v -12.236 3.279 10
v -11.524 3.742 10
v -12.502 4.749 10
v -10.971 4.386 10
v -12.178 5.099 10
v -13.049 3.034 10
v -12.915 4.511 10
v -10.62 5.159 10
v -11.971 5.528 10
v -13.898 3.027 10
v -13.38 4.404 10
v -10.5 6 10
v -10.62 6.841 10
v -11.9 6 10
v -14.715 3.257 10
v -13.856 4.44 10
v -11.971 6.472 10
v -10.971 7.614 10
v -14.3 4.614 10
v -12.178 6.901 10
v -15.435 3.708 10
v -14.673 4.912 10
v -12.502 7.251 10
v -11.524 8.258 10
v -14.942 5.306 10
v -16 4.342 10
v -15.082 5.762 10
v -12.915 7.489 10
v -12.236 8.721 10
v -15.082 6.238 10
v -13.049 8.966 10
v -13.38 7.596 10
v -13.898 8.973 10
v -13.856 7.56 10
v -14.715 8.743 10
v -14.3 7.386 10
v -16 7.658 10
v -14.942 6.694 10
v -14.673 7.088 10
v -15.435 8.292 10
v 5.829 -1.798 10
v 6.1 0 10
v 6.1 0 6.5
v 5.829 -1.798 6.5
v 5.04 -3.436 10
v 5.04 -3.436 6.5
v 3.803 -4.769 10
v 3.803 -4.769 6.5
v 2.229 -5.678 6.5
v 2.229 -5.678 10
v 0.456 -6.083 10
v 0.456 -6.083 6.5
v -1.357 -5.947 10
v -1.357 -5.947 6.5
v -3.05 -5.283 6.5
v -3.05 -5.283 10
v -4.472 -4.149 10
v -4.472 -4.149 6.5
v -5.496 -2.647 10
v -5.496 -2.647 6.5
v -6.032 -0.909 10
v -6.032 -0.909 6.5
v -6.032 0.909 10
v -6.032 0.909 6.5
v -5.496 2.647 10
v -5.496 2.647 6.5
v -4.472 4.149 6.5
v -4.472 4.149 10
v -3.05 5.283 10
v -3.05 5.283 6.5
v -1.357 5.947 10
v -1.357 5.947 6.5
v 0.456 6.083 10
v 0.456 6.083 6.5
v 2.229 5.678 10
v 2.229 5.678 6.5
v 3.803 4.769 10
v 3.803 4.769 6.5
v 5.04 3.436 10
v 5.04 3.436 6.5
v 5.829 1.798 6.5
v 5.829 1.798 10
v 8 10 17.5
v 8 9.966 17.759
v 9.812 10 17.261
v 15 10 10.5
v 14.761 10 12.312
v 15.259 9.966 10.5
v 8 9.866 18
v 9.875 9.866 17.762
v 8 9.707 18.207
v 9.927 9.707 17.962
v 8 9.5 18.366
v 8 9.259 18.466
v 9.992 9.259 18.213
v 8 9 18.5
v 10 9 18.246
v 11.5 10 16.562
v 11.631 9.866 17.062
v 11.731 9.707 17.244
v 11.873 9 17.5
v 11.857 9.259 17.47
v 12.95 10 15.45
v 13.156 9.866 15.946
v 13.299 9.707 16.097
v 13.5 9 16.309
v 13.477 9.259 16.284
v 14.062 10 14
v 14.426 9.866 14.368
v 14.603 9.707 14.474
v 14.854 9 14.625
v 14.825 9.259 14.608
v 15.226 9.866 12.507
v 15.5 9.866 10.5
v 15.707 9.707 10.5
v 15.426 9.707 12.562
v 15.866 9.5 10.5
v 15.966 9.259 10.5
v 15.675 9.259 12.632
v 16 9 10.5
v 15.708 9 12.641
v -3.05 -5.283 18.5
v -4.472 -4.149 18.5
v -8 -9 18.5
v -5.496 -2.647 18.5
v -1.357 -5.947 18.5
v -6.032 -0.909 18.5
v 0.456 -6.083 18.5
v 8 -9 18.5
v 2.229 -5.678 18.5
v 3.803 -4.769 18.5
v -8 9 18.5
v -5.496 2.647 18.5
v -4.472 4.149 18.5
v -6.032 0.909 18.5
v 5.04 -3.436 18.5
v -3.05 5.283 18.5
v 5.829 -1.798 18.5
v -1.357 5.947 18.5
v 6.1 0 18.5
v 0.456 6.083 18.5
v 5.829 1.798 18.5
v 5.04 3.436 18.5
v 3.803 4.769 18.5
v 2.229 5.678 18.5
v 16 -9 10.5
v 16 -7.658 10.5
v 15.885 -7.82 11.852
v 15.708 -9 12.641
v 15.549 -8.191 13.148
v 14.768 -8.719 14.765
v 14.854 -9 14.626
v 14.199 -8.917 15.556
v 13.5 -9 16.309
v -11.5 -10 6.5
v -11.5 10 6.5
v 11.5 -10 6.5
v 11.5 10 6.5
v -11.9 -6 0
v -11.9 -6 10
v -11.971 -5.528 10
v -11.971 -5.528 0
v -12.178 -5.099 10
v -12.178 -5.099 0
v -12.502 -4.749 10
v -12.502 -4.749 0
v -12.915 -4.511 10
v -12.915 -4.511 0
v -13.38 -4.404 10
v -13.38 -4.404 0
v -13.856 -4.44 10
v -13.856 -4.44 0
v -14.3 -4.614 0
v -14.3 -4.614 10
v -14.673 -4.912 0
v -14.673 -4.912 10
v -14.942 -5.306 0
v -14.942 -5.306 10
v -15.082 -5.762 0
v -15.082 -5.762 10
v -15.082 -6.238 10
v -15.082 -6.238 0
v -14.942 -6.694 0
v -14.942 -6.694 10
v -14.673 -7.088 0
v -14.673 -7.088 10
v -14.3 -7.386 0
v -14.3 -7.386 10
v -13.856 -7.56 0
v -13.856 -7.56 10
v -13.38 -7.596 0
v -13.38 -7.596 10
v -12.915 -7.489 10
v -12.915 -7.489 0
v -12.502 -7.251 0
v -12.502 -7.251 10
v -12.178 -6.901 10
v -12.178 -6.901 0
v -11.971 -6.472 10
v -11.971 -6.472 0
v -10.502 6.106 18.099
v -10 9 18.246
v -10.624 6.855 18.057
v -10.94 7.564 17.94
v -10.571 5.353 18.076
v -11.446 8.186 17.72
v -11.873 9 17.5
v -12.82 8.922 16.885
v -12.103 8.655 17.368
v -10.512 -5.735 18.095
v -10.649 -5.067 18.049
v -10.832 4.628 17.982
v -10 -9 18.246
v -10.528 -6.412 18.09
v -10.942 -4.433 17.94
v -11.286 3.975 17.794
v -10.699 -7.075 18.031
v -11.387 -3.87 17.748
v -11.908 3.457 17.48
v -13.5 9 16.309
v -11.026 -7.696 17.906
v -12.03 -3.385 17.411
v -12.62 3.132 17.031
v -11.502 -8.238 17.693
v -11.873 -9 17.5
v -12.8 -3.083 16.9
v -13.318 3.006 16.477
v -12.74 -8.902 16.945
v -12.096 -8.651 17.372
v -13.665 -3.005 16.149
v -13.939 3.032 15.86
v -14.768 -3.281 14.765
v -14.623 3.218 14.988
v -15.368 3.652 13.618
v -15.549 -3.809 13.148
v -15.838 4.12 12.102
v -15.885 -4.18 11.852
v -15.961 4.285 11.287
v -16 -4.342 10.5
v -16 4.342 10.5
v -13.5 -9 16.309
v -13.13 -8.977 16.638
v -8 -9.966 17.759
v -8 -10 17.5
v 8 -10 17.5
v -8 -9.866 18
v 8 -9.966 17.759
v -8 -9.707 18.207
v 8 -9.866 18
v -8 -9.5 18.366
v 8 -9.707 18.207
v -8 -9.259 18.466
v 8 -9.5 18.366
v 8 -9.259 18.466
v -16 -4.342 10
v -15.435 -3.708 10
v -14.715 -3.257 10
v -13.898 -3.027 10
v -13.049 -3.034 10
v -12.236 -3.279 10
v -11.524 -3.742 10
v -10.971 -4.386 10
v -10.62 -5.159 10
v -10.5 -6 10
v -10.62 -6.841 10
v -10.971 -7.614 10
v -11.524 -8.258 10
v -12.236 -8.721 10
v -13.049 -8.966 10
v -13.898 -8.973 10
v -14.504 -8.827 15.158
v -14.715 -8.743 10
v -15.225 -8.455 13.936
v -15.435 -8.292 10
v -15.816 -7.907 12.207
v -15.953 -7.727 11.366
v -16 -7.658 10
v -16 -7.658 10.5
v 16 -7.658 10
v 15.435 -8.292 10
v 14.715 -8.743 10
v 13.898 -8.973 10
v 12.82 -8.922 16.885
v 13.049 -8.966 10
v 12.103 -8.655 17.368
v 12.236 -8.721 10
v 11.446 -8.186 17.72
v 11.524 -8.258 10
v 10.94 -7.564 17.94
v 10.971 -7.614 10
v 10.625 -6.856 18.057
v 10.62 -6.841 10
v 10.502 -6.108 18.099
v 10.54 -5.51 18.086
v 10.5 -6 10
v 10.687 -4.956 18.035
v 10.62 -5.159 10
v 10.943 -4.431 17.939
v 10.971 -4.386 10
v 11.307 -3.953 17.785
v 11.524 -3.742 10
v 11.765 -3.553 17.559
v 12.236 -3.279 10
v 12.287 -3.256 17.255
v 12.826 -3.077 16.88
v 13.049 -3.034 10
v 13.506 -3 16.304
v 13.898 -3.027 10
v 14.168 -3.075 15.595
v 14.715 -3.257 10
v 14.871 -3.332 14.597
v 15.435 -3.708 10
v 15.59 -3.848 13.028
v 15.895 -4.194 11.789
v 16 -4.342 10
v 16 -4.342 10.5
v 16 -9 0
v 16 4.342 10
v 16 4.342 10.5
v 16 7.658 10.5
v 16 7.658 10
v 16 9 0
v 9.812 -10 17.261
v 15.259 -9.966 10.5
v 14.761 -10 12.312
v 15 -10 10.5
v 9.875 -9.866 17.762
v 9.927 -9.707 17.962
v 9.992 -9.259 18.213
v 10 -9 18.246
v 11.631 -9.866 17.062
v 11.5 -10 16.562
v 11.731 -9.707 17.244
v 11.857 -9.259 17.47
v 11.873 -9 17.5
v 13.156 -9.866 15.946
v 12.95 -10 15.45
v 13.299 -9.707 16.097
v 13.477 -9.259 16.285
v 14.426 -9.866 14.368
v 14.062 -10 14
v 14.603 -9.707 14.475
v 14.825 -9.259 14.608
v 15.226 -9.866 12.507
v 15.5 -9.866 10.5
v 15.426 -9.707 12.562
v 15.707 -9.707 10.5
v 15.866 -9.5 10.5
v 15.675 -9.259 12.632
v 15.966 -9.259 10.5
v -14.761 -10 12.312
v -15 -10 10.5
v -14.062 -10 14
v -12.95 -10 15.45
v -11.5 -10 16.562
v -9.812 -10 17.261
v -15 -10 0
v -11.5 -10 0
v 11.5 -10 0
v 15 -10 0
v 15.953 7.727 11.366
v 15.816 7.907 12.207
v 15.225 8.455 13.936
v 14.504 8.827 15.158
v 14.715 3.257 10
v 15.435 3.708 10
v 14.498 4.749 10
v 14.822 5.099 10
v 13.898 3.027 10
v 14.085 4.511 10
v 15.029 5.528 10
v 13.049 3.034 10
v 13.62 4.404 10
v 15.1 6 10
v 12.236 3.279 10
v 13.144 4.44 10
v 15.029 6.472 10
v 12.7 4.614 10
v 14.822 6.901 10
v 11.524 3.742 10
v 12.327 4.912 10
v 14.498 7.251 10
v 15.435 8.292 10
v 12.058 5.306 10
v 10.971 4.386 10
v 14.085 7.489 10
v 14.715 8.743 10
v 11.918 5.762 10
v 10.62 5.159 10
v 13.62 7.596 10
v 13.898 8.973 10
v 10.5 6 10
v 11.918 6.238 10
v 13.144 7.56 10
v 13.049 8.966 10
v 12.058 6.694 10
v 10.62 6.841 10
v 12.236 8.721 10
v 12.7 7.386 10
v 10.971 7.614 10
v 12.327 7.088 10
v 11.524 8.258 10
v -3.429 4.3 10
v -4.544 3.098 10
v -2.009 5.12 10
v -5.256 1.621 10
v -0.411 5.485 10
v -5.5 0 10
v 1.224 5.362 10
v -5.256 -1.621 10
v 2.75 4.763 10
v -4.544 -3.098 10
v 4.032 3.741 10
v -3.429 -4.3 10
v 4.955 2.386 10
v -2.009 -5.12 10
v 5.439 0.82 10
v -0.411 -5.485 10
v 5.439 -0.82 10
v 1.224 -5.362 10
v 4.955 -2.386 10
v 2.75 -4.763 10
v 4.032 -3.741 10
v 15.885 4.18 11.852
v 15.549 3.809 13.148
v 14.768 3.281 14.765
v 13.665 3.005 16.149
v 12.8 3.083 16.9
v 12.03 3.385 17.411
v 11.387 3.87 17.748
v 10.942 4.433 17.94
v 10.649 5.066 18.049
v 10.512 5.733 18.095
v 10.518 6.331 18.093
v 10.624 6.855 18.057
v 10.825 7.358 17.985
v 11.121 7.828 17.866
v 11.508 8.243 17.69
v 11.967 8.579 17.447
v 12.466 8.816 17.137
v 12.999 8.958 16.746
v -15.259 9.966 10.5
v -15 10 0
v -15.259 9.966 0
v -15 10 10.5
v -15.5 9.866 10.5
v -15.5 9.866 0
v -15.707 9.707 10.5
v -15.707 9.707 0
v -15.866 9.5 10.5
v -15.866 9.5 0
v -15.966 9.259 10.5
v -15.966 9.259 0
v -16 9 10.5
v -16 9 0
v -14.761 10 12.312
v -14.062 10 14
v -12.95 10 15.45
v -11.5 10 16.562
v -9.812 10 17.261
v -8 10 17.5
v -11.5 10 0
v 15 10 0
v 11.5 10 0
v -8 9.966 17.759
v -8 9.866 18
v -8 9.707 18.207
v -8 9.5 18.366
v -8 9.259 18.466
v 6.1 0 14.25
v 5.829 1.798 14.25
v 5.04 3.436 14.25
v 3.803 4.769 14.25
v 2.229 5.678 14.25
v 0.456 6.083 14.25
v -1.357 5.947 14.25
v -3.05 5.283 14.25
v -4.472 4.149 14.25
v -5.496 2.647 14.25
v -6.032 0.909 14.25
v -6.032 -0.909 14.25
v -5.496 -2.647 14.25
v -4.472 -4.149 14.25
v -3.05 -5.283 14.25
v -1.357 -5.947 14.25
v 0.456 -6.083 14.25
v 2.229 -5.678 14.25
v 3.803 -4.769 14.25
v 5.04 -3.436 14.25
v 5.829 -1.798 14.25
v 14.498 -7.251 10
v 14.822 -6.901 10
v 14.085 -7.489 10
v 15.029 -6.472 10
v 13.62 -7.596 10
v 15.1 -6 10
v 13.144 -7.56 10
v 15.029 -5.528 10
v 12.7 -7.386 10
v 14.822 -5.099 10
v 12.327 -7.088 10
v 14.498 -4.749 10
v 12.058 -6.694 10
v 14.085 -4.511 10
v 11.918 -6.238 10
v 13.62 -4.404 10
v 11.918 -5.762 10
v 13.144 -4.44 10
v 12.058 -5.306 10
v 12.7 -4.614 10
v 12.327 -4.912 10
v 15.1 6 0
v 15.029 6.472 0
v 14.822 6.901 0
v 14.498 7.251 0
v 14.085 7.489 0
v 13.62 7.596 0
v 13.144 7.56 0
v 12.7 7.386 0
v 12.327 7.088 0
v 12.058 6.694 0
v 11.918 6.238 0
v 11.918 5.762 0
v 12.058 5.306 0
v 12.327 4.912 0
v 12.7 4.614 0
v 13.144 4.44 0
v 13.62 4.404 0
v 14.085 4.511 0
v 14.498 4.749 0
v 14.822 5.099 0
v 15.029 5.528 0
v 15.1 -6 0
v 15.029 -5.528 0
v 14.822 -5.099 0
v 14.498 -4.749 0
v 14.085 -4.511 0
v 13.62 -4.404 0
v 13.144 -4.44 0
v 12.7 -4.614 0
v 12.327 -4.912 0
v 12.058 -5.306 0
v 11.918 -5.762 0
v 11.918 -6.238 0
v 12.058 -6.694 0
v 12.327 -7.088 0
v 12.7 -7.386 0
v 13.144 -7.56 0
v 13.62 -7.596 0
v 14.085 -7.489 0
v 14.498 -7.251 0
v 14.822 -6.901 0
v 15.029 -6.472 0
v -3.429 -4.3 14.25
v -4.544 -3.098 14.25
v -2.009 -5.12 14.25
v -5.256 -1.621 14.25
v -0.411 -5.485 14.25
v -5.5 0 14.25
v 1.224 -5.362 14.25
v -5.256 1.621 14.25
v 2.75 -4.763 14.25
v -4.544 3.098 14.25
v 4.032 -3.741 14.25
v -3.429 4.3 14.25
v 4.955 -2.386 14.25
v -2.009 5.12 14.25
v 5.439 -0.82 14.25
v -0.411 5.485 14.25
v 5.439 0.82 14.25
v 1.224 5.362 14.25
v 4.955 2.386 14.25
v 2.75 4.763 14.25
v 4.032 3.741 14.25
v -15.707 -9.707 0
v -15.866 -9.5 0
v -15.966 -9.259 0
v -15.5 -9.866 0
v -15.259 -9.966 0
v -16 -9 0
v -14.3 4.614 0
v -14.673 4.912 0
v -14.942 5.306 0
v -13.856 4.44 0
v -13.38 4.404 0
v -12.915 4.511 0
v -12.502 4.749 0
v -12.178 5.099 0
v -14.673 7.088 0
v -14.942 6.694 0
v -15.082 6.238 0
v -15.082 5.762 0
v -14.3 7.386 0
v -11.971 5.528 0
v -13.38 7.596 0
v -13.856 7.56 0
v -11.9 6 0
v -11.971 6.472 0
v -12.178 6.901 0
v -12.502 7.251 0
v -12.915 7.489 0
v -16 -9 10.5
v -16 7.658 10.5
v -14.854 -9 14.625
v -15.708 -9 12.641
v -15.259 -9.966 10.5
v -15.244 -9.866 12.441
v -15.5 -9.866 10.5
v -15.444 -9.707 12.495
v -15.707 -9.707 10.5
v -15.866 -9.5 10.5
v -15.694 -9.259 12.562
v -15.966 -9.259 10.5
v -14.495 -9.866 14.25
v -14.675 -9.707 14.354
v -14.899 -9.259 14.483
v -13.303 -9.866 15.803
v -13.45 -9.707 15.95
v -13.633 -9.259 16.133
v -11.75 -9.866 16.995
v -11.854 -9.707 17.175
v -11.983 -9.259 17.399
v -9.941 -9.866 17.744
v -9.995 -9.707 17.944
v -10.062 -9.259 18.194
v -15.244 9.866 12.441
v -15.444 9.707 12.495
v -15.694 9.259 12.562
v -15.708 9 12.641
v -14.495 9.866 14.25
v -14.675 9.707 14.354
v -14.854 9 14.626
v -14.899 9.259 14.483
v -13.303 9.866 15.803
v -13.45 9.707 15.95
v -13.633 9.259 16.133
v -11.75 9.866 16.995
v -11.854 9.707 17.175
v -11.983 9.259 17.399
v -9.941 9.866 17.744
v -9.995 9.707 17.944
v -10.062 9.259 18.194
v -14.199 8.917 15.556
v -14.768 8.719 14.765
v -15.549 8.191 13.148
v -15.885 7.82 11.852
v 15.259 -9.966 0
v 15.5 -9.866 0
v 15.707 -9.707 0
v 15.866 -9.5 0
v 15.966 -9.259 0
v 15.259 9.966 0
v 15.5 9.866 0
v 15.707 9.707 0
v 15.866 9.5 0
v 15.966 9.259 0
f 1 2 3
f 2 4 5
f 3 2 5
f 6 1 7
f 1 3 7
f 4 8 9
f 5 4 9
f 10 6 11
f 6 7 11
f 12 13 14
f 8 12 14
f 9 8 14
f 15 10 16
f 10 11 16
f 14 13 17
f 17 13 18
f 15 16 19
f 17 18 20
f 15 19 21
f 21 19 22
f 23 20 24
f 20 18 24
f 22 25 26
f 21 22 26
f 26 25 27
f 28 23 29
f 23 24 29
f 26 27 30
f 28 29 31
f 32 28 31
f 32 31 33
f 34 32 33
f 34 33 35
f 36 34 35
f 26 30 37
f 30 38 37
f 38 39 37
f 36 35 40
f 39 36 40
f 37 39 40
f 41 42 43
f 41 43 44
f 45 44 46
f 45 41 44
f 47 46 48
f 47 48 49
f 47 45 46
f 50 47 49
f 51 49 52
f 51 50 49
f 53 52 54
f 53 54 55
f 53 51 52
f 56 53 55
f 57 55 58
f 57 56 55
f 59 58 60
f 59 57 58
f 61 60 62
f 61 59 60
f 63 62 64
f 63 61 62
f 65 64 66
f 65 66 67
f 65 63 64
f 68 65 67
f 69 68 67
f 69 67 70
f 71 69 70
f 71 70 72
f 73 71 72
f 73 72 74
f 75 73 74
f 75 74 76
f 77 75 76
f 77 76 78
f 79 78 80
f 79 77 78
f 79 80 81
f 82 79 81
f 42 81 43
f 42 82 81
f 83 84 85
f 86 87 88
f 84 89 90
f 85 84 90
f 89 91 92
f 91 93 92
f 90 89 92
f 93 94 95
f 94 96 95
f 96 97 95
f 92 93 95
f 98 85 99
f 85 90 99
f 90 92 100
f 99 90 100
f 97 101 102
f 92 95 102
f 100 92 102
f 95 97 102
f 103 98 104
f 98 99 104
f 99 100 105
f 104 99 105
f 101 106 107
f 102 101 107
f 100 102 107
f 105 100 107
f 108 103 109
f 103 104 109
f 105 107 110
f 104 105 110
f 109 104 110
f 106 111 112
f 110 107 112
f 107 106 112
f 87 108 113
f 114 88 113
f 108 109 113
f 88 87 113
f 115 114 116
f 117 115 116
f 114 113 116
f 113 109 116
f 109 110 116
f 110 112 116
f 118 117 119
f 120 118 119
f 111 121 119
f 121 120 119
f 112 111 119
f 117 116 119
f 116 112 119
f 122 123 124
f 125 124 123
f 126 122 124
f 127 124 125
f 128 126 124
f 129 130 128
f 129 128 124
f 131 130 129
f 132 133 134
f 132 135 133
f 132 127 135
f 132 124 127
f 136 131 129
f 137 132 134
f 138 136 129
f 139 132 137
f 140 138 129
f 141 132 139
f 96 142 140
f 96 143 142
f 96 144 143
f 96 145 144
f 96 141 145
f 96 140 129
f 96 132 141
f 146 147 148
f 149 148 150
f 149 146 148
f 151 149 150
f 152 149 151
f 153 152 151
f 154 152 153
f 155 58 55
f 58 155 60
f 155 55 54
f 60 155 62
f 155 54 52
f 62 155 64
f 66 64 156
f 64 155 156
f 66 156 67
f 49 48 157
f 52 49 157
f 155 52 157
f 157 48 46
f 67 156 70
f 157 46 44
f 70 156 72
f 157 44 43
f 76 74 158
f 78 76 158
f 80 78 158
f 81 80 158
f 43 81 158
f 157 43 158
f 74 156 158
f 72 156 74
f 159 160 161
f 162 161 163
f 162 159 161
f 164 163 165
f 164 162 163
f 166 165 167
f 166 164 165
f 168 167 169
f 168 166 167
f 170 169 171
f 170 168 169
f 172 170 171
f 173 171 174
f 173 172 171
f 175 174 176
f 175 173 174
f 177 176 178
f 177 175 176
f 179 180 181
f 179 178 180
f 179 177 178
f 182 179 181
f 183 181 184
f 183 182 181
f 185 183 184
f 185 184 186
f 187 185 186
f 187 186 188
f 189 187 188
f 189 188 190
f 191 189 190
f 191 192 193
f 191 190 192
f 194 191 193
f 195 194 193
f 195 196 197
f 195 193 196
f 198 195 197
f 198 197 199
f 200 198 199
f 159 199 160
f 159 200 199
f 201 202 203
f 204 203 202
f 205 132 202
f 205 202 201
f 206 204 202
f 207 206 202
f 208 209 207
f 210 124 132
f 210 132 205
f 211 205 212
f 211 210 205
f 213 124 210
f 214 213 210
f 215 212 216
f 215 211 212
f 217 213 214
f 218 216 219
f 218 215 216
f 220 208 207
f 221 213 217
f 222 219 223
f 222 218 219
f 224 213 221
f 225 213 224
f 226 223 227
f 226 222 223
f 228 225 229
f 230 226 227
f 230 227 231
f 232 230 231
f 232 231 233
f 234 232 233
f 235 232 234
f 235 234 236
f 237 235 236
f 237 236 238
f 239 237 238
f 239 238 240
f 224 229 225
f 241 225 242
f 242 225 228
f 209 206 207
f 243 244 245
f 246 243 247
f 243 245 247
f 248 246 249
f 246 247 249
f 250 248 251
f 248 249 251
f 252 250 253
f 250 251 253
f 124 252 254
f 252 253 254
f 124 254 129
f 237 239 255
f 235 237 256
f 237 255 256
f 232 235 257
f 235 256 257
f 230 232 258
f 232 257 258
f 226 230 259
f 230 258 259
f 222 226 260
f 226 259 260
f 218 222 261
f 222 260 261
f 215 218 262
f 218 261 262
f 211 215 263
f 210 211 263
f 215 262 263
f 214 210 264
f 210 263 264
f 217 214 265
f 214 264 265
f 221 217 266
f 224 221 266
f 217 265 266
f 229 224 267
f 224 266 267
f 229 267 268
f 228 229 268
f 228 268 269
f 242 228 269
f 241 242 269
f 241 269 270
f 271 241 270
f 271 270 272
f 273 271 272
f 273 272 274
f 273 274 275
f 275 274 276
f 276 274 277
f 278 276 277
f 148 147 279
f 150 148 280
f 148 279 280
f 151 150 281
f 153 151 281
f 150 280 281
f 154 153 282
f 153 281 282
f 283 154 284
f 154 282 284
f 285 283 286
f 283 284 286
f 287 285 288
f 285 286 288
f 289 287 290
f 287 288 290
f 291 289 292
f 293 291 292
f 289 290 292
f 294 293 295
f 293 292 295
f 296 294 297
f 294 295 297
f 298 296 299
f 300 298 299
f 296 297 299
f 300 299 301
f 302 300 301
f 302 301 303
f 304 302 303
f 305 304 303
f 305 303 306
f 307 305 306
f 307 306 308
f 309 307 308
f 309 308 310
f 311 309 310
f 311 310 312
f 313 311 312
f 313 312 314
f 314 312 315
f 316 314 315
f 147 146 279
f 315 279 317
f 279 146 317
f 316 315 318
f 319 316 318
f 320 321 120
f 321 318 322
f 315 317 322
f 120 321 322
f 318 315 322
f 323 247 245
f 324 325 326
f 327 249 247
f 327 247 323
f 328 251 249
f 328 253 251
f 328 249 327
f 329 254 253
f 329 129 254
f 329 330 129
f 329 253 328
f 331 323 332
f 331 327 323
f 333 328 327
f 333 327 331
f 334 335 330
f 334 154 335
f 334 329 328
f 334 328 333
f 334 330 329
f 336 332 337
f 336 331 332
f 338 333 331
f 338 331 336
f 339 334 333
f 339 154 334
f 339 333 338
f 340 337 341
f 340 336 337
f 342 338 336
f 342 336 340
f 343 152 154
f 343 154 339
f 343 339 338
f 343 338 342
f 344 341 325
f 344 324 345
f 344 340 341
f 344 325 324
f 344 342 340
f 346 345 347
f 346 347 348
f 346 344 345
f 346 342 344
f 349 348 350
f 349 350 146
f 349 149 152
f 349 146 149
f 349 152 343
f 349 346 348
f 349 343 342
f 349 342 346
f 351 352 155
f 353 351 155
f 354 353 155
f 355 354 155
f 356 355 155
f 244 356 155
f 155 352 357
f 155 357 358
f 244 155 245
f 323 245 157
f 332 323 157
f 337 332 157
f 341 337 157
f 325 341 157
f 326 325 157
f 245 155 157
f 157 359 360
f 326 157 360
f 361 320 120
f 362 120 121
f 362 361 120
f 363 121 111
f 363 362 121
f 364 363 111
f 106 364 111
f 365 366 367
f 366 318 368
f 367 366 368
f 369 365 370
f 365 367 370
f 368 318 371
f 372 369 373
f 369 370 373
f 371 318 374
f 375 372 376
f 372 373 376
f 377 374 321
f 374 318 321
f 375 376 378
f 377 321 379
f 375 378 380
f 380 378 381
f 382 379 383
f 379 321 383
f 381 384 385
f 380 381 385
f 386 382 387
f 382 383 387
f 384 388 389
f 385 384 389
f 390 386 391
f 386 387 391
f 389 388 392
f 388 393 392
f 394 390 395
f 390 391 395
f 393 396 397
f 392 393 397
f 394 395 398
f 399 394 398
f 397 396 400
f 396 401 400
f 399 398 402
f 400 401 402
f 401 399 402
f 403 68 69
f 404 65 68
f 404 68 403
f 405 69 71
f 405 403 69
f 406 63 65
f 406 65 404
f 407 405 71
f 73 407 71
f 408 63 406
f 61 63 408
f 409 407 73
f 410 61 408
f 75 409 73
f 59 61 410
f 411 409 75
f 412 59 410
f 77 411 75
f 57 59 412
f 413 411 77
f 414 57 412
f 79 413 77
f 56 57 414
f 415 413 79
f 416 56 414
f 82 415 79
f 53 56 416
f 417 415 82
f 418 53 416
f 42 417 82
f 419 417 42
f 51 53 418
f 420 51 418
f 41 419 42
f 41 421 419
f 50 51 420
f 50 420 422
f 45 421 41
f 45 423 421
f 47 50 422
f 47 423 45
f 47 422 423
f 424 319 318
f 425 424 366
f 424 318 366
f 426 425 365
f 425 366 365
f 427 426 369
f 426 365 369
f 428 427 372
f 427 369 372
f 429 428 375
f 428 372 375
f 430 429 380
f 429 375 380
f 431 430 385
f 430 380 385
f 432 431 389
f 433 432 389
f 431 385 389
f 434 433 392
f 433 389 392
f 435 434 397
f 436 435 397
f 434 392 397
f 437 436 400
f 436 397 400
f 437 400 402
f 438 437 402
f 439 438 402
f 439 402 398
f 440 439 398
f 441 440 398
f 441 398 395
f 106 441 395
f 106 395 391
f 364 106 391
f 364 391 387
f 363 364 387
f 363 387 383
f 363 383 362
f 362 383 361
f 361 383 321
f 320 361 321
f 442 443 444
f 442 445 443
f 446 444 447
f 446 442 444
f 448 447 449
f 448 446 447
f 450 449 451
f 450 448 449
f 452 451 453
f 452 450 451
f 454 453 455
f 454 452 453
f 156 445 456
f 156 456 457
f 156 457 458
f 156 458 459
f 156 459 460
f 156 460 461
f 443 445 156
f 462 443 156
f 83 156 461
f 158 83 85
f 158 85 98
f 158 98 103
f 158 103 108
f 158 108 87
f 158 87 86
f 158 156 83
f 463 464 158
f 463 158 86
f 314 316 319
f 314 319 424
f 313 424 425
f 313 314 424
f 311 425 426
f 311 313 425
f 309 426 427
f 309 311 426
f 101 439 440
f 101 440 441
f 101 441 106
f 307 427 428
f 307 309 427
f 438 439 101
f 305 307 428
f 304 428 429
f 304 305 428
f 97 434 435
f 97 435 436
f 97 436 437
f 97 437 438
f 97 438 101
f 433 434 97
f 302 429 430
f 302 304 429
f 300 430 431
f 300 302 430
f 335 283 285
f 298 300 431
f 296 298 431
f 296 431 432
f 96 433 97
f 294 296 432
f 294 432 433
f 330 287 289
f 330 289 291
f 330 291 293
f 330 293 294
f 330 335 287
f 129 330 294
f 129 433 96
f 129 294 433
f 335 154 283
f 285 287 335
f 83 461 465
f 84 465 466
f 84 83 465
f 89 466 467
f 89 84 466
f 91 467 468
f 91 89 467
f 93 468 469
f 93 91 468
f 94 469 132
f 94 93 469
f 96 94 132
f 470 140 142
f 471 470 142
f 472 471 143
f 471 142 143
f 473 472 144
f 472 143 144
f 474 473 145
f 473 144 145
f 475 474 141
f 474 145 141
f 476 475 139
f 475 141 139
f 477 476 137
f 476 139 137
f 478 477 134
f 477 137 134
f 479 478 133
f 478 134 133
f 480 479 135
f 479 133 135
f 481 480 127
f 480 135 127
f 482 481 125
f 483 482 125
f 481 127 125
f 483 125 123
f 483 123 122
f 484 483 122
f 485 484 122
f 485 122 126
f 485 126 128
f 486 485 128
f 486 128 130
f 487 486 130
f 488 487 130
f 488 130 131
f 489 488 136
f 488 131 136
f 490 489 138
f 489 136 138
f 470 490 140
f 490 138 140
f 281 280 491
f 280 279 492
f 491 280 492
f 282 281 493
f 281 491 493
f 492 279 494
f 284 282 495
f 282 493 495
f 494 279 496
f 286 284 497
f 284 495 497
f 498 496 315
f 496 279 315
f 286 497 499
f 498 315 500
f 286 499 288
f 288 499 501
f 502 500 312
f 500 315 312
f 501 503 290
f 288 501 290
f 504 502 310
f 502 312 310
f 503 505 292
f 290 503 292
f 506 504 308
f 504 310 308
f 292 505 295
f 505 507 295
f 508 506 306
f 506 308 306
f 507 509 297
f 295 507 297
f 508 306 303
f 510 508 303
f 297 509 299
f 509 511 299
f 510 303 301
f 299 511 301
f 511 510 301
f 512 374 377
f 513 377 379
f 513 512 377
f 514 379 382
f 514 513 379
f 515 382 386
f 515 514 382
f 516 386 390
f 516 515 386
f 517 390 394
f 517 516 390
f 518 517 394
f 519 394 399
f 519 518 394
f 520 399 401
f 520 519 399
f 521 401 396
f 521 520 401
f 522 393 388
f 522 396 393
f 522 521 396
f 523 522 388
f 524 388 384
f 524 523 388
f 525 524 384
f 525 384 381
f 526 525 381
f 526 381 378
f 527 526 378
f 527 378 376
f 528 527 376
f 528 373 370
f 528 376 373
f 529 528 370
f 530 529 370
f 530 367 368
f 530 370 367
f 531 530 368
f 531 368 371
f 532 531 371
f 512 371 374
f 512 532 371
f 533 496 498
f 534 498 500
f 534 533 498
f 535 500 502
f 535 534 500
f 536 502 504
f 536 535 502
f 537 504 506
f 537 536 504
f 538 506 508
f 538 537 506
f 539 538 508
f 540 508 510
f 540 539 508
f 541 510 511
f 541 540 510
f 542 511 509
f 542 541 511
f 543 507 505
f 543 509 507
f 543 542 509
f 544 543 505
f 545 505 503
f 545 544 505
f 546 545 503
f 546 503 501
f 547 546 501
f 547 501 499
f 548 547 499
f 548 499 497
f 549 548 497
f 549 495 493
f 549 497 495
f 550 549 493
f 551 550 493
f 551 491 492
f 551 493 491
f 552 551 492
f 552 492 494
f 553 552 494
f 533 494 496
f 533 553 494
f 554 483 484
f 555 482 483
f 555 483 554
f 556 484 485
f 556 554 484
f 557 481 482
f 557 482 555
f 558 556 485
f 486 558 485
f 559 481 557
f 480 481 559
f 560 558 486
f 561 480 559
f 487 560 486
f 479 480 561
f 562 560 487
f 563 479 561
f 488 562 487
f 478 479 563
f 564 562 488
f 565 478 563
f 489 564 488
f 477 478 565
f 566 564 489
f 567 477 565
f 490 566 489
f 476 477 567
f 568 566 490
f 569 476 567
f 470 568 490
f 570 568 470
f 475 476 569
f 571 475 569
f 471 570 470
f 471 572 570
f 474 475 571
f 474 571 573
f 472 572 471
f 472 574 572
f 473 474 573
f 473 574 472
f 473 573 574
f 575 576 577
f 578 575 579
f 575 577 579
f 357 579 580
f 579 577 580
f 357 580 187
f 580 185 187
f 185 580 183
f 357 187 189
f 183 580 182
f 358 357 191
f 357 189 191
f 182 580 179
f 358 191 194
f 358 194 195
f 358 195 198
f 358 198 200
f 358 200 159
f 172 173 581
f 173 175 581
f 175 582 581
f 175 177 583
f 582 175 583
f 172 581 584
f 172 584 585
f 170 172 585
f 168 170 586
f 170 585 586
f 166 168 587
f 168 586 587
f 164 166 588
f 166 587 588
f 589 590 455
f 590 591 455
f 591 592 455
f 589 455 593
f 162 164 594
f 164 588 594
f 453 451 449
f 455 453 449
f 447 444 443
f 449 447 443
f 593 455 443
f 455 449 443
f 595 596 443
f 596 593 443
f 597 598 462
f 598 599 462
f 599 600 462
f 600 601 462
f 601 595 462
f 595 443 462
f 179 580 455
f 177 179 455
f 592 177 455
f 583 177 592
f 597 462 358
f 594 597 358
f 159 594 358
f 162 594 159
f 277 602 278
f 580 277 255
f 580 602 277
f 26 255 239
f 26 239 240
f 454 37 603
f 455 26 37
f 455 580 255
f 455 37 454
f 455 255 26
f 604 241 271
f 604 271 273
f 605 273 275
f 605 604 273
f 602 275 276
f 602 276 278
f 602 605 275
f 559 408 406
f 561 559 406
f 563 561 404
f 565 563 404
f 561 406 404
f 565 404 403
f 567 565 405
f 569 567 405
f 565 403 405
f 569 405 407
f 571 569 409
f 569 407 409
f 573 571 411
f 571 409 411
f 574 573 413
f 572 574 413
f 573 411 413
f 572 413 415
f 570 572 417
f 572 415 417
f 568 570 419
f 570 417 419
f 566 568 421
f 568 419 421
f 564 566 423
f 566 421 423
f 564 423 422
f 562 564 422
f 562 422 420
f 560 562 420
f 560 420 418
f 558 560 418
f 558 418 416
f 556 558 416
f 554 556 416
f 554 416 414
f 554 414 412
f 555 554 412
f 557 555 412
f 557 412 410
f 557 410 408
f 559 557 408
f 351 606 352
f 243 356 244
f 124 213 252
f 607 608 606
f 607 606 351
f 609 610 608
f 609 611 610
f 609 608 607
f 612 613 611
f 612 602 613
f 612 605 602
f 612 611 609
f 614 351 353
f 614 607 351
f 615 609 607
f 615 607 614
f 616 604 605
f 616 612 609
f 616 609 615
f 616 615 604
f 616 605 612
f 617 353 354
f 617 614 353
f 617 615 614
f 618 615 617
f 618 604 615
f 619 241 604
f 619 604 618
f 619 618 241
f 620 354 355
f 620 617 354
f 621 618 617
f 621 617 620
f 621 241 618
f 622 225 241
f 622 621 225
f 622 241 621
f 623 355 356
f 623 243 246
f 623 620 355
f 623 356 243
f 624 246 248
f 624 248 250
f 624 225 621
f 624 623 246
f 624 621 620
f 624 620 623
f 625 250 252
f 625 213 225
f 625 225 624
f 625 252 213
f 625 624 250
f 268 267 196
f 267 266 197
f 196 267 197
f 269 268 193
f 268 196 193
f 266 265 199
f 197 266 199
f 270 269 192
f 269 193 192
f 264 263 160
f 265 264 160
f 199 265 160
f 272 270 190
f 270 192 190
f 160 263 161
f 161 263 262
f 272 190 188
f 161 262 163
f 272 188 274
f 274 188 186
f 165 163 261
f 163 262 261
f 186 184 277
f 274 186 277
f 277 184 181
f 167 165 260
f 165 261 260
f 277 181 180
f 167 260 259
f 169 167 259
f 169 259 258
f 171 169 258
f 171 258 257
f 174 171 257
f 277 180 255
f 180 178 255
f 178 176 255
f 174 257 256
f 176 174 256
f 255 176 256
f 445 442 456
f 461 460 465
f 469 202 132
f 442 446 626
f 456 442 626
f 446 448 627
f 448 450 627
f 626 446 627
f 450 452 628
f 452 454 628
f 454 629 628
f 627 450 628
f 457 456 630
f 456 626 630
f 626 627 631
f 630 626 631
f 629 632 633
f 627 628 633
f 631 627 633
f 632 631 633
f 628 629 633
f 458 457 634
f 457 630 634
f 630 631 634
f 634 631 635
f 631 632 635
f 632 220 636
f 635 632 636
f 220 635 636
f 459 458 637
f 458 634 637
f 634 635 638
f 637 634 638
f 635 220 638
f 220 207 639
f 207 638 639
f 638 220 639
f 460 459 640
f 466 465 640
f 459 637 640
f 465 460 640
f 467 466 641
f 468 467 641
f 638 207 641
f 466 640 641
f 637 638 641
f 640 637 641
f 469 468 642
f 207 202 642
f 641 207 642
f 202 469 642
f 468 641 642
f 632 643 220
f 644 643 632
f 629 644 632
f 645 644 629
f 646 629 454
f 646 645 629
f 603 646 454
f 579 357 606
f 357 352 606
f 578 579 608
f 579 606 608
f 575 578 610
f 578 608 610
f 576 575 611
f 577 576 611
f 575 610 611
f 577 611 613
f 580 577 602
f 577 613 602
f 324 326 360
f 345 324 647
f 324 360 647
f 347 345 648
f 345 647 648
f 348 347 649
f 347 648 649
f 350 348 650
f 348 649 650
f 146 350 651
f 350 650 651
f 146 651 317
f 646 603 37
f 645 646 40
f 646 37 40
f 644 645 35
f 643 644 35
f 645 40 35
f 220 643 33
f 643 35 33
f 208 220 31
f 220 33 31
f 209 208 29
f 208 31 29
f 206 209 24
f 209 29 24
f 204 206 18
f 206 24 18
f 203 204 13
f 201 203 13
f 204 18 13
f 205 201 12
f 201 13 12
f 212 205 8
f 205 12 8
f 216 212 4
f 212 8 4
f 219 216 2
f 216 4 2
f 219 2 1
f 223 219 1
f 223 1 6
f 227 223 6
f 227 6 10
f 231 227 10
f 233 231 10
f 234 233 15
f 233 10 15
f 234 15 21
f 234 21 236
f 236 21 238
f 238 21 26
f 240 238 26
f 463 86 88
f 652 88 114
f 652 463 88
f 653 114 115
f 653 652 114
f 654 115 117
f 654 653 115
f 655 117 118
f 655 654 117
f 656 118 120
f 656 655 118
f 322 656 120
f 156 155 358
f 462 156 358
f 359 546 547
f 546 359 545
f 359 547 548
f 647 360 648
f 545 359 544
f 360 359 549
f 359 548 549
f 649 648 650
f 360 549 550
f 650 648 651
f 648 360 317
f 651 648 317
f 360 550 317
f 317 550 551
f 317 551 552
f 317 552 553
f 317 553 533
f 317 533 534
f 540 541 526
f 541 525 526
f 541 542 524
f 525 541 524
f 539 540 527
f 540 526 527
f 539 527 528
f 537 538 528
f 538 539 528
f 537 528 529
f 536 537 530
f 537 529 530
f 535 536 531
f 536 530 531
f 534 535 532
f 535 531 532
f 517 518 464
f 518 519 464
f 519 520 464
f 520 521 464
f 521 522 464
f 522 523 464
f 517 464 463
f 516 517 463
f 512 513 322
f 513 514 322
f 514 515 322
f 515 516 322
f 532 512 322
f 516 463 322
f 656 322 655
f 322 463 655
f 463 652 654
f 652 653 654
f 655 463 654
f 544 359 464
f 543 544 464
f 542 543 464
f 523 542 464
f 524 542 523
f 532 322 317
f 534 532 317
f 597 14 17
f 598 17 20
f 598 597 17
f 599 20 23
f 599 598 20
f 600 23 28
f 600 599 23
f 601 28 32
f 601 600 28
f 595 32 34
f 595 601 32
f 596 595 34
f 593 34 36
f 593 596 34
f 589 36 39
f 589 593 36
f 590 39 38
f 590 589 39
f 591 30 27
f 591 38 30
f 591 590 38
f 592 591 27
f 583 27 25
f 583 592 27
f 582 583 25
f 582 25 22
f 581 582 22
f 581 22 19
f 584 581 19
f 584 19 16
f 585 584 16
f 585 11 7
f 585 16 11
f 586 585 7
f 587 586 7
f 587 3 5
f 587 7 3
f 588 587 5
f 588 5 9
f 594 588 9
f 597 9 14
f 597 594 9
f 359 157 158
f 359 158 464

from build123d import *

# Parameters (mm, degrees)
SKETCH3_W           = 32
SKETCH3_H           = 20
SKETCH3_R           = 1.6
BOSS_EXTRUDE1_DEPTH = 18.5
CUT_EXTRUDE1_REACH  = 33.595
SKETCH5_W           = 23
SKETCH5_H           = 6.5
FILLET2_START       = -11
FILLET2_DEPTH       = 22
FILLET1_R           = 1
CUT_EXTRUDE5_REACH  = 38.424
CUT_EXTRUDE5_START  = -10
SKETCH9_R           = 3
SKETCH10_R          = 6.1
CUT_EXTRUDE6_DEPTH  = 4.25
CUT_EXTRUDE7_START  = -3.5
SKETCH12_R          = 6.1
CUT_EXTRUDE7_DEPTH  = 3.5
CUT_EXTRUDE8_REACH  = 23.354
SKETCH13_R          = 5.5


with BuildPart() as part:
    # Sketch3 → Boss-Extrude1 (new body)
    with BuildSketch(Plane.XY):
        Rectangle(SKETCH3_W, SKETCH3_H)
        with Locations((-13.5, 6)):
            Circle(SKETCH3_R, mode=Mode.SUBTRACT)
        with Locations((-13.5, -6)):
            Circle(SKETCH3_R, mode=Mode.SUBTRACT)
        with Locations((13.5, -6)):
            Circle(SKETCH3_R, mode=Mode.SUBTRACT)
        with Locations((13.5, 6)):
            Circle(SKETCH3_R, mode=Mode.SUBTRACT)
    extrude(amount=BOSS_EXTRUDE1_DEPTH)

    # Sketch5 → Cut-Extrude1 (cut, up to next)
    with BuildSketch(Plane(origin=(0, 10, 0), x_dir=(1, 0, 0), z_dir=(0, 1, 0)), mode=Mode.PRIVATE) as cut_extrude1_sk1:
        with Locations((0, -3.25)):
            Rectangle(SKETCH5_W, SKETCH5_H)
    cut_extrude1_tool1 = extrude(cut_extrude1_sk1.sketch, amount=-CUT_EXTRUDE1_REACH, mode=Mode.PRIVATE) & part.part
    add(cut_extrude1_tool1.solids().sort_by_distance((0, 10, 3.25))[0], mode=Mode.SUBTRACT)

    # Fillet2: read off the stored shape, not the designer's step
    # Fillet2 outline → Fillet2 (cut)
    with BuildSketch(Plane(origin=(0, 0, 0), x_dir=(1, 0, 0), z_dir=(0, 1, 0)).offset(FILLET2_START)):
        with BuildLine():
            ThreePointArc((16, -10.5), (13.656854249, -16.156854249), (8, -18.5))
            Line((8, -18.5), (16, -18.5))
            Line((16, -18.5), (16, -10.5))
        make_face()
        with BuildLine():
            Line((-16, -18.5), (-8, -18.5))
            ThreePointArc((-8, -18.5), (-13.656854249, -16.156854249), (-16, -10.5))
            Line((-16, -10.5), (-16, -18.5))
        make_face()
    extrude(amount=FILLET2_DEPTH, mode=Mode.SUBTRACT)

    # Fillet1
    fillet1_edges = [part.edges().sort_by_distance(p)[0] for p in [
        (0, 10, 18.5),
        (0, -10, 18.5),
        (-16, 10, 5.25),
        (16, 10, 5.25),
        (-13.656854249, 10, 16.156854249),
        (13.656854249, 10, 16.156854249),
        (16, -10, 5.25),
        (-16, -10, 5.25),
        (-13.656854249, -10, 16.156854249),
        (13.656854249, -10, 16.156854249),
    ]]
    fillet(fillet1_edges, radius=FILLET1_R)

    # Sketch9 → Cut-Extrude5 (cut, up to next)
    with BuildSketch(Plane(origin=(0, 0, 0), x_dir=(-1, 0, 0), z_dir=(0, 0, -1)).offset(CUT_EXTRUDE5_START), mode=Mode.PRIVATE) as cut_extrude5_sk1:
        with Locations((-13.5, 6)):
            Circle(SKETCH9_R)
    cut_extrude5_tool1 = extrude(cut_extrude5_sk1.sketch, amount=-CUT_EXTRUDE5_REACH, mode=Mode.PRIVATE) & part.part
    # Sketch9 → Cut-Extrude5 (cut, up to next)
    with BuildSketch(Plane(origin=(0, 0, 0), x_dir=(-1, 0, 0), z_dir=(0, 0, -1)).offset(CUT_EXTRUDE5_START), mode=Mode.PRIVATE) as cut_extrude5_sk2:
        with Locations((-13.5, -6)):
            Circle(SKETCH9_R)
    cut_extrude5_tool2 = extrude(cut_extrude5_sk2.sketch, amount=-CUT_EXTRUDE5_REACH, mode=Mode.PRIVATE) & part.part
    # Sketch9 → Cut-Extrude5 (cut, up to next)
    with BuildSketch(Plane(origin=(0, 0, 0), x_dir=(-1, 0, 0), z_dir=(0, 0, -1)).offset(CUT_EXTRUDE5_START), mode=Mode.PRIVATE) as cut_extrude5_sk3:
        with Locations((13.5, -6)):
            Circle(SKETCH9_R)
    cut_extrude5_tool3 = extrude(cut_extrude5_sk3.sketch, amount=-CUT_EXTRUDE5_REACH, mode=Mode.PRIVATE) & part.part
    # Sketch9 → Cut-Extrude5 (cut, up to next)
    with BuildSketch(Plane(origin=(0, 0, 0), x_dir=(-1, 0, 0), z_dir=(0, 0, -1)).offset(CUT_EXTRUDE5_START), mode=Mode.PRIVATE) as cut_extrude5_sk4:
        with Locations((13.5, 6)):
            Circle(SKETCH9_R)
    cut_extrude5_tool4 = extrude(cut_extrude5_sk4.sketch, amount=-CUT_EXTRUDE5_REACH, mode=Mode.PRIVATE) & part.part
    add(cut_extrude5_tool1.solids().sort_by_distance((13.5, 6, 10))[0], mode=Mode.SUBTRACT)
    add(cut_extrude5_tool2.solids().sort_by_distance((13.5, -6, 10))[0], mode=Mode.SUBTRACT)
    add(cut_extrude5_tool3.solids().sort_by_distance((-13.5, -6, 10))[0], mode=Mode.SUBTRACT)
    add(cut_extrude5_tool4.solids().sort_by_distance((-13.5, 6, 10))[0], mode=Mode.SUBTRACT)

    # Sketch10 → Cut-Extrude6 (cut)
    with BuildSketch(Plane.XY.offset(18.5)):
        Circle(SKETCH10_R)
    extrude(amount=-CUT_EXTRUDE6_DEPTH, mode=Mode.SUBTRACT)

    # Sketch12 → Cut-Extrude7 (cut)
    with BuildSketch(Plane(origin=(0, 0, 6.5), x_dir=(-1, 0, 0), z_dir=(0, 0, -1)).offset(CUT_EXTRUDE7_START)):
        with Locations(Location((0, 0, 0), (0, 0, 180))):
            Circle(SKETCH12_R)
    extrude(amount=CUT_EXTRUDE7_DEPTH, mode=Mode.SUBTRACT)

    # Sketch13 → Cut-Extrude8 (cut, up to next)
    with BuildSketch(Plane(origin=(0, 0, 10), x_dir=(-1, 0, 0), z_dir=(0, 0, -1)), mode=Mode.PRIVATE) as cut_extrude8_sk1:
        Circle(SKETCH13_R)
    cut_extrude8_tool1 = extrude(cut_extrude8_sk1.sketch, amount=-CUT_EXTRUDE8_REACH, mode=Mode.PRIVATE) & part.part
    add(cut_extrude8_tool1.solids().sort_by_distance((0, 0, 10))[0], mode=Mode.SUBTRACT)


solid = part.part
